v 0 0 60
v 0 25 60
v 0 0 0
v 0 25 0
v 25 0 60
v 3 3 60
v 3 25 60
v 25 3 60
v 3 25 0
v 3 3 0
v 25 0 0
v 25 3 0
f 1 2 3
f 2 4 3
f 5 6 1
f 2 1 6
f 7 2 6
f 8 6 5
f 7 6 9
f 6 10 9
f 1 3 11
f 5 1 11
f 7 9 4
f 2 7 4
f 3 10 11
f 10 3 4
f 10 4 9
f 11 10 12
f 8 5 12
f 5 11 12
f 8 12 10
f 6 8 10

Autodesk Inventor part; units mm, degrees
ref_plane "YZ Plane" through (0, 0, 0) normal (1, 0, 0) x (0, 1, 0)
ref_plane "XZ Plane" through (0, 0, 0) normal (0, 1, 0) x (-1, 0, 0)
ref_plane "XY Plane" through (0, 0, 0) normal (0, 0, 1) x (1, 0, 0)
sketch "Sketch1" plane through (0, 0, 0) normal (0, 0, 1) x (1, 0, 0)
  line L0 (0, 0) -> (25, 0)
  line L1 (25, 0) -> (25, 3)
  line L2 (25, 3) -> (3, 3)
  line L3 (3, 3) -> (3, 25)
  line L4 (3, 25) -> (0, 25)
  line L5 (0, 25) -> (0, 0)
  dimension "d0" = 25
  dimension "d1" = 3
  dimension "d2" = 22
  dimension "d3" = 22
extrude "Extrusion1" add sketch "Sketch1" along normal blind 60
sketch "Sketch2" plane through (3, 3, 0) normal (1, 0, 0) x (0, 0, -1)
  line L0 (0, 0) -> (0, 22) projected
  line L1 (0, 22) -> (-60, 22) projected
  line L2 (-60, 0) -> (-60, 22) projected
  line L3 (0, 0) -> (-60, 0) projected
  line L4 (0, 22) -> (-1.4085, 22)
  line L5 (0, 22) -> (-9.5, 22) construction
  line L6 (-9.5, 22) -> (-8.5825, 22) construction
  line L7 (-9.5, 22) -> (-23.165, 22) construction
  line L8 (-23.165, 22) -> (-23.165, 2.4653) construction
  point P0 (0, -3)
  dimension "d6" = 9.5
  dimension "d7" = 13.665
properties part number "printed Y rod holder bracket"
